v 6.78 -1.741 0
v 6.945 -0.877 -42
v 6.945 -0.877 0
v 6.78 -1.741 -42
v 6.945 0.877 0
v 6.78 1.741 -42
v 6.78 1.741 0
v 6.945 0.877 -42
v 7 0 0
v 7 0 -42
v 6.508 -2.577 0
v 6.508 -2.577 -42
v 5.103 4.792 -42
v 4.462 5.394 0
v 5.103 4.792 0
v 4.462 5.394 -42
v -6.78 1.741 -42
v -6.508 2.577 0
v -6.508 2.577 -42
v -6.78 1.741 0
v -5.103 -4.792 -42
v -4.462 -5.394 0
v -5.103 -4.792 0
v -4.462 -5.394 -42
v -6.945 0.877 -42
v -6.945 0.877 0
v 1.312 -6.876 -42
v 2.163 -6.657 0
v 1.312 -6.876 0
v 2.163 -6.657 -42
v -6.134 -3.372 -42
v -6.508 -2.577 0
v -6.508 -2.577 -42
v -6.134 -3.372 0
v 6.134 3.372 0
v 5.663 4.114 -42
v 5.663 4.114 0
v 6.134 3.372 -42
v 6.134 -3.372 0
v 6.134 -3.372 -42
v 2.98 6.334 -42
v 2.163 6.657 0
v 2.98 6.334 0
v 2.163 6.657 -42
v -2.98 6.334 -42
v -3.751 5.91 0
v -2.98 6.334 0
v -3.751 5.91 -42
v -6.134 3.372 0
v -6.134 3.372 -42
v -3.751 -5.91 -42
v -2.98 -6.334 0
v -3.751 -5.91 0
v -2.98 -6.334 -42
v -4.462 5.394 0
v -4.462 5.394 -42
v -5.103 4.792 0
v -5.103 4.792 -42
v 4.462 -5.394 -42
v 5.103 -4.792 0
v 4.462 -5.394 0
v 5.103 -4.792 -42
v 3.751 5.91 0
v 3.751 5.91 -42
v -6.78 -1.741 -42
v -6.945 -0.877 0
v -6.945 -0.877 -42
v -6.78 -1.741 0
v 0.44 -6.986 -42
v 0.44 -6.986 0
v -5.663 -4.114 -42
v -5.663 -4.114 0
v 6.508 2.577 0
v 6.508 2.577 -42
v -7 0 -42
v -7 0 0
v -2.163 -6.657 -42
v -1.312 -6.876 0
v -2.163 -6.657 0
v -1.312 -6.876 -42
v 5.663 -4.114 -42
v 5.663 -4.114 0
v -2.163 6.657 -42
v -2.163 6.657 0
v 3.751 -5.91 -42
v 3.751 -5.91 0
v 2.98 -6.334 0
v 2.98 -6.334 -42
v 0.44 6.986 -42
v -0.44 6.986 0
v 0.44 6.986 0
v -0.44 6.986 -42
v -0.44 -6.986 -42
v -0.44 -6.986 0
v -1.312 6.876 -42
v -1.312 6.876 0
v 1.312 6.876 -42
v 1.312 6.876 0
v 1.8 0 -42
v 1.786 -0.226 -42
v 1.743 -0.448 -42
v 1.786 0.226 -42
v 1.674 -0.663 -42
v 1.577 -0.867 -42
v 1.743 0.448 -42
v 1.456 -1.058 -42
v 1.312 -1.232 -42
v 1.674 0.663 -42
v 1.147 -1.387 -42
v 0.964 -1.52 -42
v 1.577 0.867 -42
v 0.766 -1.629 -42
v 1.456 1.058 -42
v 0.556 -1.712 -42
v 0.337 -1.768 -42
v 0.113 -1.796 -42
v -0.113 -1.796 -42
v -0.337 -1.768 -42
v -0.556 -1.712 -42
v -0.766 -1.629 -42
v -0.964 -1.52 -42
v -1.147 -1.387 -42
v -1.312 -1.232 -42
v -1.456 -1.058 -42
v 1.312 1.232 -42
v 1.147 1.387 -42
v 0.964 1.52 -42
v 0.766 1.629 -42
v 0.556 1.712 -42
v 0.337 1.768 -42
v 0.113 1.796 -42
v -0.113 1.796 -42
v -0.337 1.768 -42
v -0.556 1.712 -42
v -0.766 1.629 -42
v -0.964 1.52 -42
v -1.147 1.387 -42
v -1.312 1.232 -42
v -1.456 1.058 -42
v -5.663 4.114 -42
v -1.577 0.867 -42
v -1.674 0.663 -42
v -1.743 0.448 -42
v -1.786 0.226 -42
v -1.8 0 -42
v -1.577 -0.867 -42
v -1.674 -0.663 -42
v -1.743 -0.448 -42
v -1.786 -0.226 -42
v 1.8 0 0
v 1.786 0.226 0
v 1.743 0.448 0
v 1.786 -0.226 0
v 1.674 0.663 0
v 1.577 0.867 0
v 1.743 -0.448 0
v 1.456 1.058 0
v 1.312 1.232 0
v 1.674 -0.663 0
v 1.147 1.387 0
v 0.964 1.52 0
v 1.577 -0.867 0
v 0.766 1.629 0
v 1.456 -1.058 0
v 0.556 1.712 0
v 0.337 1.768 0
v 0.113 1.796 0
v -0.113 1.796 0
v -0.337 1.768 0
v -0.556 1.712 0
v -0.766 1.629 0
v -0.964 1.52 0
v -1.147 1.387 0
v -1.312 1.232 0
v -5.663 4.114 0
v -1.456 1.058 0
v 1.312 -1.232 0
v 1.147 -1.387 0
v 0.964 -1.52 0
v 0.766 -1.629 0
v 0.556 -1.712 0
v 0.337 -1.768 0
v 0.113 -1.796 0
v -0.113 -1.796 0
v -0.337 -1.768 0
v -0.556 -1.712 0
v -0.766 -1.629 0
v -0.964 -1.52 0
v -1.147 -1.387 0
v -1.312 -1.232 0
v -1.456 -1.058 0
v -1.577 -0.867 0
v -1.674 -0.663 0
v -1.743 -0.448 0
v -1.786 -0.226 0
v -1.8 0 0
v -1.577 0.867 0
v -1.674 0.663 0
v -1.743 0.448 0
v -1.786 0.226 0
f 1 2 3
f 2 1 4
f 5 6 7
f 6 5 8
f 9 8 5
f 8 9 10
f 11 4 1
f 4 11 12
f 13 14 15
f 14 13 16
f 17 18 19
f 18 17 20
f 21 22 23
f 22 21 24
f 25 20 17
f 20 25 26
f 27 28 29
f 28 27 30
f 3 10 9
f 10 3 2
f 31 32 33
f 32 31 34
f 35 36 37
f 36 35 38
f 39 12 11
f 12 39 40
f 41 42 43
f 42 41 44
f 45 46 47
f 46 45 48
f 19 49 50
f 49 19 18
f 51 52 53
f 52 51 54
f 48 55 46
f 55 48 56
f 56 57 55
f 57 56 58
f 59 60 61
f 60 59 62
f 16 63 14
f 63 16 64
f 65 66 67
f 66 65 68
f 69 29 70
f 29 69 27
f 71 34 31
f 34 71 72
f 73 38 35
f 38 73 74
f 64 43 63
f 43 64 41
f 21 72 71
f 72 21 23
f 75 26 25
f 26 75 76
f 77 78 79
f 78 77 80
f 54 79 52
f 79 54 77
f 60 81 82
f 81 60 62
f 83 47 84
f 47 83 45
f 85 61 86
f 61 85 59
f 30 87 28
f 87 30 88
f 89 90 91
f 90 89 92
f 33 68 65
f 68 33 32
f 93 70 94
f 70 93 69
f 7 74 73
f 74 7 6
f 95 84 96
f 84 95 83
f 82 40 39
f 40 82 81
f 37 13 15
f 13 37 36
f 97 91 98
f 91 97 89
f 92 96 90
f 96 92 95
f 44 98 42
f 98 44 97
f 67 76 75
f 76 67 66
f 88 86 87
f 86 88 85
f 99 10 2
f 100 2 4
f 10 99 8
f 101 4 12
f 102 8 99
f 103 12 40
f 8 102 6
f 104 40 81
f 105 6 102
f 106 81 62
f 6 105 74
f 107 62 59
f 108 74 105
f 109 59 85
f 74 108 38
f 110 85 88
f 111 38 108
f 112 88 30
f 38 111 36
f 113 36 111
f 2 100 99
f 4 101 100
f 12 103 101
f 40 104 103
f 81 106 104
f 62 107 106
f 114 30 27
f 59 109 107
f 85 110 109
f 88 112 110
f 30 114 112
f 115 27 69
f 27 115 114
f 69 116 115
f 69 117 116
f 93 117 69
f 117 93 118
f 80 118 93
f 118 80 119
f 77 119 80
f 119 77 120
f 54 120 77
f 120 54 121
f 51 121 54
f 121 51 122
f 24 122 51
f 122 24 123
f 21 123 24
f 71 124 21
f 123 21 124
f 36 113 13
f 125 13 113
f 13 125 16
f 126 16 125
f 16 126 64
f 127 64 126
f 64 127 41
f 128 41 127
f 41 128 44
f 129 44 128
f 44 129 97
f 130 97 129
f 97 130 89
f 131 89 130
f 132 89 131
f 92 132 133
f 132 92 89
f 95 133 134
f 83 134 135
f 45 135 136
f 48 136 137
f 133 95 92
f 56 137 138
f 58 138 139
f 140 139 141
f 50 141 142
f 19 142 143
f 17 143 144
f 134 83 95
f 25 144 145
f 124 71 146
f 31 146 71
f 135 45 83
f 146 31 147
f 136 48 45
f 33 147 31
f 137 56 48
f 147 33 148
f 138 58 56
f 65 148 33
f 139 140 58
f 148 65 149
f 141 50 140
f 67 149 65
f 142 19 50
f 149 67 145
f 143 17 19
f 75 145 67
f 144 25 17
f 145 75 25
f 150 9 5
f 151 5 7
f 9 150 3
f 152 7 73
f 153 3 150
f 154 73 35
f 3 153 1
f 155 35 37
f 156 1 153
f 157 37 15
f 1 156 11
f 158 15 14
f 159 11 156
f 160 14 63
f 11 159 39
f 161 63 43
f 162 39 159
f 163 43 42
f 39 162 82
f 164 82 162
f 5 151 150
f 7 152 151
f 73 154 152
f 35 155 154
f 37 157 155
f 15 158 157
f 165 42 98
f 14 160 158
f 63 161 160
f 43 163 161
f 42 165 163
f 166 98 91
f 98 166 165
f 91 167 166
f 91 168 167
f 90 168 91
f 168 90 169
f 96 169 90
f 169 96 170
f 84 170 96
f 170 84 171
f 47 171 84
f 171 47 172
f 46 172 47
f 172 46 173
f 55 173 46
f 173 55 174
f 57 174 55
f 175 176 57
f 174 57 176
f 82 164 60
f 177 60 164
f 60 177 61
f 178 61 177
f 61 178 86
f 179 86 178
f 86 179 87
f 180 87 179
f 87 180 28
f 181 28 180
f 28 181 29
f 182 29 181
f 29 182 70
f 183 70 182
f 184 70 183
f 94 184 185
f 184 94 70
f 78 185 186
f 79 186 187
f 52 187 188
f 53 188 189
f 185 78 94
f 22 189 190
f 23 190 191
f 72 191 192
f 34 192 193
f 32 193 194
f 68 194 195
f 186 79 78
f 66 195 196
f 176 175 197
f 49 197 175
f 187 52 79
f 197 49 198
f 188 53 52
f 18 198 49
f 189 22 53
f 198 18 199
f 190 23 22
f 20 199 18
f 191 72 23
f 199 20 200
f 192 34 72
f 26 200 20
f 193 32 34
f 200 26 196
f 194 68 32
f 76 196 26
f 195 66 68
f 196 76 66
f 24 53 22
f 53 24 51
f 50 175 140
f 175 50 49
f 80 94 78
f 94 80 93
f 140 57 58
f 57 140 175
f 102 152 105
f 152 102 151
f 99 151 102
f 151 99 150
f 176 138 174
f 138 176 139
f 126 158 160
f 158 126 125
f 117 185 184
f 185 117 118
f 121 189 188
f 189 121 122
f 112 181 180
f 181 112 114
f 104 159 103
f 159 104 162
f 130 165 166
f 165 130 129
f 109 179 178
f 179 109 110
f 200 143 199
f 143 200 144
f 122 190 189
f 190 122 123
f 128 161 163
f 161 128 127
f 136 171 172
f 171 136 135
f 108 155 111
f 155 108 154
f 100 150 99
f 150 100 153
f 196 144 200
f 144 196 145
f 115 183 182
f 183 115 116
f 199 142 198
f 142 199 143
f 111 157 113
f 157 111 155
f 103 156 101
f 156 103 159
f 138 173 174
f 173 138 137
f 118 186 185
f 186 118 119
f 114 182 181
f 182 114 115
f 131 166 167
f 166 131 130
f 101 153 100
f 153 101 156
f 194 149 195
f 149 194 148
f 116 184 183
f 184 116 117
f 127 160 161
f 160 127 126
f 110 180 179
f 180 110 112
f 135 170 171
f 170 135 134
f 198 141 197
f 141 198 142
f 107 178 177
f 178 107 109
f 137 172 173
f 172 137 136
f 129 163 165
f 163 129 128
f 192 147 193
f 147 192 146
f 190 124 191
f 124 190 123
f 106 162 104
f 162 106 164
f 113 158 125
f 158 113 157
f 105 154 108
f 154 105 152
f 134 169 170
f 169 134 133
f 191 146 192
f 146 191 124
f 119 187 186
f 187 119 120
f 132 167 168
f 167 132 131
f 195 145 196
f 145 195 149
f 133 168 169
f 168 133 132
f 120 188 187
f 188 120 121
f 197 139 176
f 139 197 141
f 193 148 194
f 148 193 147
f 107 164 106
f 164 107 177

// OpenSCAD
$fn = 50;


difference() {
	union() {
		translate(v = [0, 0, -42.0000000000]) {
			cylinder(h = 42, r = 7.0000000000);
		}
	}
	union() {
		#translate(v = [0, 0, -42]) {
			cylinder(h = 42, r = 1.8000000000);
		}
	}
}
